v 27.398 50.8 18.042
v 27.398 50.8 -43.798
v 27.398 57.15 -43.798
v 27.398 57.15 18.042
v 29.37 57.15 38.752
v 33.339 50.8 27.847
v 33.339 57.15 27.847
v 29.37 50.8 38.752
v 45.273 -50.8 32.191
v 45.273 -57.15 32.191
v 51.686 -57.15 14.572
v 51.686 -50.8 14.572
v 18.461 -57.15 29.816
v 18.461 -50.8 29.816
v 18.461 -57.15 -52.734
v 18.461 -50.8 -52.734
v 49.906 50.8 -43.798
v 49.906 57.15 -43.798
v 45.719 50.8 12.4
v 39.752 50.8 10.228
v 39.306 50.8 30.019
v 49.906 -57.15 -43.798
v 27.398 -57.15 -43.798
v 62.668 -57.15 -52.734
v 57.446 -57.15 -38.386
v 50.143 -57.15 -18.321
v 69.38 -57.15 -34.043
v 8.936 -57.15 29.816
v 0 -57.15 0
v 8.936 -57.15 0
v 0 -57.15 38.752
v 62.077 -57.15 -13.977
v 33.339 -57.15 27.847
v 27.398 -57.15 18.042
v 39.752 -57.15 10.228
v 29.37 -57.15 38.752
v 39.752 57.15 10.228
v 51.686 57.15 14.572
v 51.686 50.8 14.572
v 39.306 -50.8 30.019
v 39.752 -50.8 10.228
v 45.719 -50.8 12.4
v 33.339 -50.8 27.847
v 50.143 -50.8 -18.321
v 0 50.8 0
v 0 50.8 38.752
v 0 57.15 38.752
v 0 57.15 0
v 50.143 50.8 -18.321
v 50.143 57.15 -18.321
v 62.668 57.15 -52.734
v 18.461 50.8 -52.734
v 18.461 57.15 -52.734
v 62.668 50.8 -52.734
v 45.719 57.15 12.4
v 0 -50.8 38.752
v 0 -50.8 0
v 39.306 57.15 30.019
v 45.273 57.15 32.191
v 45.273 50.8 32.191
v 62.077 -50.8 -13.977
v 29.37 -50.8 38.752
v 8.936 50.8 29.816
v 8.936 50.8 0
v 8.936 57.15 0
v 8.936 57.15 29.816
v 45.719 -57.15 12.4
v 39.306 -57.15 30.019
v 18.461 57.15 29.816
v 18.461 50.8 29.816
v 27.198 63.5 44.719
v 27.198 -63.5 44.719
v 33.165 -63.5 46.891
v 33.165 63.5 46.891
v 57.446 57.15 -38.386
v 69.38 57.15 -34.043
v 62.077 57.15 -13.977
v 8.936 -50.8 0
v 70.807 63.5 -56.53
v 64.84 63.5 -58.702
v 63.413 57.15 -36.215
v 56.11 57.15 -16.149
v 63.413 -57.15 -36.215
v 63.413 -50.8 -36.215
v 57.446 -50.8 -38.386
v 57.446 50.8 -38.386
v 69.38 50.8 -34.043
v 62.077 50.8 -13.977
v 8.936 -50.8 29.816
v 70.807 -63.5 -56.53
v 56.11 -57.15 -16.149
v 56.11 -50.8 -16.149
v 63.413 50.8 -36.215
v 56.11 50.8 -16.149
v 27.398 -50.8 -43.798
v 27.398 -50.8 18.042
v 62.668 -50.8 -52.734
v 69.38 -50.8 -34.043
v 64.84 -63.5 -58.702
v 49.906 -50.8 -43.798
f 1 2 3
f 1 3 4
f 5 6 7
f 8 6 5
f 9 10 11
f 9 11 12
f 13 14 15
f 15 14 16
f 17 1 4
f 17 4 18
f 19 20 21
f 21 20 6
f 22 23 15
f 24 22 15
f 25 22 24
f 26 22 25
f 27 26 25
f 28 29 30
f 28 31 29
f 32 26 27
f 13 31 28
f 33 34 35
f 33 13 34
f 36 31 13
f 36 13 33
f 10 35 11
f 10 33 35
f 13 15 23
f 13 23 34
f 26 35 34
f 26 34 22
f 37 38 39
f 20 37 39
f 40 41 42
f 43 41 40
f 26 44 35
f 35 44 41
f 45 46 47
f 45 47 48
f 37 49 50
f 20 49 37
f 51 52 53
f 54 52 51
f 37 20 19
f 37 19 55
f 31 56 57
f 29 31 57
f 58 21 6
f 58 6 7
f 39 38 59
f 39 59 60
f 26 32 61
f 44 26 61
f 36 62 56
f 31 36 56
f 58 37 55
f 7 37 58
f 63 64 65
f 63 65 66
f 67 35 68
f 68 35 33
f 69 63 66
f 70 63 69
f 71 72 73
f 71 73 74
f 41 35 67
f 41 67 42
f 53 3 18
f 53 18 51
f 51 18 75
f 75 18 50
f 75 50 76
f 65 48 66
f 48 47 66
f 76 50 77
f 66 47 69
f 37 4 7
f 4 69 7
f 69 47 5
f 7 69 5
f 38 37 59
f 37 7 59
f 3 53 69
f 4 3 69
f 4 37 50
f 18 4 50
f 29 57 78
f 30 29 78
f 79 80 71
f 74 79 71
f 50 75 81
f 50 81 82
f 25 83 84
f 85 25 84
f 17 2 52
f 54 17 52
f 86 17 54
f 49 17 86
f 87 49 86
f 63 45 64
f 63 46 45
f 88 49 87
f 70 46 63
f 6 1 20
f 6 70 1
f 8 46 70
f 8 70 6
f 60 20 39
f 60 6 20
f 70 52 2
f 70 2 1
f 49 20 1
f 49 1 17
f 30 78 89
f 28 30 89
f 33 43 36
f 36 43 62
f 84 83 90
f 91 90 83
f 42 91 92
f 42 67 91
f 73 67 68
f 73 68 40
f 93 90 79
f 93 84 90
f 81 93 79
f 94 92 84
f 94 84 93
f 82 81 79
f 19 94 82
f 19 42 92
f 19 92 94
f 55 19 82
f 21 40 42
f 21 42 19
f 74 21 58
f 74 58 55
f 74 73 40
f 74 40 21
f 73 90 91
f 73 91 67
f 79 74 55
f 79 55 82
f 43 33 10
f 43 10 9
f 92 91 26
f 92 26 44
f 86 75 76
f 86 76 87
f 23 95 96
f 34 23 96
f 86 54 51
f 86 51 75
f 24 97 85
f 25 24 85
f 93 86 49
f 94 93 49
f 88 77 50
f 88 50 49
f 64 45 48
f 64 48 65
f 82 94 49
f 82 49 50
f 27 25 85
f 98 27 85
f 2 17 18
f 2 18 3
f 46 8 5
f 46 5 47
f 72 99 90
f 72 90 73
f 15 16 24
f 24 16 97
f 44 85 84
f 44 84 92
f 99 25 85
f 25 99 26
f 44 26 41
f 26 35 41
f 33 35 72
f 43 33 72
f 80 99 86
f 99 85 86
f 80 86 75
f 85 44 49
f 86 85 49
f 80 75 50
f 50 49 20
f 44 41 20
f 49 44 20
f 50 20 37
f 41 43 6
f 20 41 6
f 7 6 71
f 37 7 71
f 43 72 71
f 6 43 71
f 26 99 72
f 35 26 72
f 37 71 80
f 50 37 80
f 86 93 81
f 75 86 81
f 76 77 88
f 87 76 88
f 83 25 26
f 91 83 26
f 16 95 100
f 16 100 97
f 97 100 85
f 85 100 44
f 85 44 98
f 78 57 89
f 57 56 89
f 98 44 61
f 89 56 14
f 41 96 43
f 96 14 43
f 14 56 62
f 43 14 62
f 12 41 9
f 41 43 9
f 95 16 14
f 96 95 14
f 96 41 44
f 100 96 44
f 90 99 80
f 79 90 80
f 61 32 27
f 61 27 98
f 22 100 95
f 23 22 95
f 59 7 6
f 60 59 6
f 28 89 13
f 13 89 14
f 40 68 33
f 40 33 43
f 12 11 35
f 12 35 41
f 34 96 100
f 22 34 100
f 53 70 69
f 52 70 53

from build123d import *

# Parameters (mm, degrees)
F3_DEPTH = 6.35
F4_W     = 6.35
F4_H     = 18.7495299615
F4_H_2   = 21.3536322117
F5_DEPTH = 12.7
F7_W     = 127
F7_H     = 110.0578334834
F7_W_2   = 6.35
F7_H_2   = 21.3536322117
F7_H_3   = 18.7495299615
F8_DEPTH = 6.35


with BuildPart() as f3:
    # F2 (on offset) → F3 (new body)
    with BuildSketch(Plane.XZ.offset(50.8)):
        Polygon((0, 0), (8.9364377001, 0), (8.9364377001, 29.8155217013), (18.4614377001, 29.8155217013), (18.4614377001, -52.7344782987), (62.6683148833, -52.7344782987), (29.3699747215, 38.7519594014), (0, 38.7519594014), align=None)
        Polygon((27.3978754002, 18.0418618862), (49.9057591946, -43.7980405986), (27.3978754002, -43.7980405986), align=None, mode=Mode.SUBTRACT)
    extrude(amount=F3_DEPTH)

    # F4 (on face) → F5 (join)
    with BuildSketch(Plane(origin=(38.3889800028, 0, 13.9724460449), x_dir=(0, 1, 0), z_dir=(0.9396926208, 0, 0.3420201433))):
        with Locations((-53.975, 5.3904128727)):
            Rectangle(F4_W, F4_H)
        with Locations((-53.975, -45.0423508883)):
            Rectangle(F4_W, F4_H_2)
    extrude(amount=F5_DEPTH)


with BuildPart() as f6_1:
    # F6: instance of F3
    add(f3.part.mirror(Plane.XZ))


with BuildPart() as f8:
    # F7 (on face) → F8 (new body)
    with BuildSketch(Plane(origin=(38.3889800028, 0, 13.9724460449), x_dir=(0, 1, 0), z_dir=(0.9396926208, 0, 0.3420201433))):
        with Locations((0, -22.309109415)):
            Rectangle(F7_W, F7_H)
        with Locations((-53.975, -45.0423508883)):
            Rectangle(F7_W_2, F7_H_2, mode=Mode.SUBTRACT)
        with Locations((53.975, -45.0423508883)):
            Rectangle(F7_W_2, F7_H_2, mode=Mode.SUBTRACT)
        with Locations((-53.975, 5.3904128727)):
            Rectangle(F7_W_2, F7_H_3, mode=Mode.SUBTRACT)
        with Locations((53.975, 5.3904128727)):
            Rectangle(F7_W_2, F7_H_3, mode=Mode.SUBTRACT)
    extrude(amount=F8_DEPTH)


solid = Compound([f3.part, f6_1.part, f8.part])
